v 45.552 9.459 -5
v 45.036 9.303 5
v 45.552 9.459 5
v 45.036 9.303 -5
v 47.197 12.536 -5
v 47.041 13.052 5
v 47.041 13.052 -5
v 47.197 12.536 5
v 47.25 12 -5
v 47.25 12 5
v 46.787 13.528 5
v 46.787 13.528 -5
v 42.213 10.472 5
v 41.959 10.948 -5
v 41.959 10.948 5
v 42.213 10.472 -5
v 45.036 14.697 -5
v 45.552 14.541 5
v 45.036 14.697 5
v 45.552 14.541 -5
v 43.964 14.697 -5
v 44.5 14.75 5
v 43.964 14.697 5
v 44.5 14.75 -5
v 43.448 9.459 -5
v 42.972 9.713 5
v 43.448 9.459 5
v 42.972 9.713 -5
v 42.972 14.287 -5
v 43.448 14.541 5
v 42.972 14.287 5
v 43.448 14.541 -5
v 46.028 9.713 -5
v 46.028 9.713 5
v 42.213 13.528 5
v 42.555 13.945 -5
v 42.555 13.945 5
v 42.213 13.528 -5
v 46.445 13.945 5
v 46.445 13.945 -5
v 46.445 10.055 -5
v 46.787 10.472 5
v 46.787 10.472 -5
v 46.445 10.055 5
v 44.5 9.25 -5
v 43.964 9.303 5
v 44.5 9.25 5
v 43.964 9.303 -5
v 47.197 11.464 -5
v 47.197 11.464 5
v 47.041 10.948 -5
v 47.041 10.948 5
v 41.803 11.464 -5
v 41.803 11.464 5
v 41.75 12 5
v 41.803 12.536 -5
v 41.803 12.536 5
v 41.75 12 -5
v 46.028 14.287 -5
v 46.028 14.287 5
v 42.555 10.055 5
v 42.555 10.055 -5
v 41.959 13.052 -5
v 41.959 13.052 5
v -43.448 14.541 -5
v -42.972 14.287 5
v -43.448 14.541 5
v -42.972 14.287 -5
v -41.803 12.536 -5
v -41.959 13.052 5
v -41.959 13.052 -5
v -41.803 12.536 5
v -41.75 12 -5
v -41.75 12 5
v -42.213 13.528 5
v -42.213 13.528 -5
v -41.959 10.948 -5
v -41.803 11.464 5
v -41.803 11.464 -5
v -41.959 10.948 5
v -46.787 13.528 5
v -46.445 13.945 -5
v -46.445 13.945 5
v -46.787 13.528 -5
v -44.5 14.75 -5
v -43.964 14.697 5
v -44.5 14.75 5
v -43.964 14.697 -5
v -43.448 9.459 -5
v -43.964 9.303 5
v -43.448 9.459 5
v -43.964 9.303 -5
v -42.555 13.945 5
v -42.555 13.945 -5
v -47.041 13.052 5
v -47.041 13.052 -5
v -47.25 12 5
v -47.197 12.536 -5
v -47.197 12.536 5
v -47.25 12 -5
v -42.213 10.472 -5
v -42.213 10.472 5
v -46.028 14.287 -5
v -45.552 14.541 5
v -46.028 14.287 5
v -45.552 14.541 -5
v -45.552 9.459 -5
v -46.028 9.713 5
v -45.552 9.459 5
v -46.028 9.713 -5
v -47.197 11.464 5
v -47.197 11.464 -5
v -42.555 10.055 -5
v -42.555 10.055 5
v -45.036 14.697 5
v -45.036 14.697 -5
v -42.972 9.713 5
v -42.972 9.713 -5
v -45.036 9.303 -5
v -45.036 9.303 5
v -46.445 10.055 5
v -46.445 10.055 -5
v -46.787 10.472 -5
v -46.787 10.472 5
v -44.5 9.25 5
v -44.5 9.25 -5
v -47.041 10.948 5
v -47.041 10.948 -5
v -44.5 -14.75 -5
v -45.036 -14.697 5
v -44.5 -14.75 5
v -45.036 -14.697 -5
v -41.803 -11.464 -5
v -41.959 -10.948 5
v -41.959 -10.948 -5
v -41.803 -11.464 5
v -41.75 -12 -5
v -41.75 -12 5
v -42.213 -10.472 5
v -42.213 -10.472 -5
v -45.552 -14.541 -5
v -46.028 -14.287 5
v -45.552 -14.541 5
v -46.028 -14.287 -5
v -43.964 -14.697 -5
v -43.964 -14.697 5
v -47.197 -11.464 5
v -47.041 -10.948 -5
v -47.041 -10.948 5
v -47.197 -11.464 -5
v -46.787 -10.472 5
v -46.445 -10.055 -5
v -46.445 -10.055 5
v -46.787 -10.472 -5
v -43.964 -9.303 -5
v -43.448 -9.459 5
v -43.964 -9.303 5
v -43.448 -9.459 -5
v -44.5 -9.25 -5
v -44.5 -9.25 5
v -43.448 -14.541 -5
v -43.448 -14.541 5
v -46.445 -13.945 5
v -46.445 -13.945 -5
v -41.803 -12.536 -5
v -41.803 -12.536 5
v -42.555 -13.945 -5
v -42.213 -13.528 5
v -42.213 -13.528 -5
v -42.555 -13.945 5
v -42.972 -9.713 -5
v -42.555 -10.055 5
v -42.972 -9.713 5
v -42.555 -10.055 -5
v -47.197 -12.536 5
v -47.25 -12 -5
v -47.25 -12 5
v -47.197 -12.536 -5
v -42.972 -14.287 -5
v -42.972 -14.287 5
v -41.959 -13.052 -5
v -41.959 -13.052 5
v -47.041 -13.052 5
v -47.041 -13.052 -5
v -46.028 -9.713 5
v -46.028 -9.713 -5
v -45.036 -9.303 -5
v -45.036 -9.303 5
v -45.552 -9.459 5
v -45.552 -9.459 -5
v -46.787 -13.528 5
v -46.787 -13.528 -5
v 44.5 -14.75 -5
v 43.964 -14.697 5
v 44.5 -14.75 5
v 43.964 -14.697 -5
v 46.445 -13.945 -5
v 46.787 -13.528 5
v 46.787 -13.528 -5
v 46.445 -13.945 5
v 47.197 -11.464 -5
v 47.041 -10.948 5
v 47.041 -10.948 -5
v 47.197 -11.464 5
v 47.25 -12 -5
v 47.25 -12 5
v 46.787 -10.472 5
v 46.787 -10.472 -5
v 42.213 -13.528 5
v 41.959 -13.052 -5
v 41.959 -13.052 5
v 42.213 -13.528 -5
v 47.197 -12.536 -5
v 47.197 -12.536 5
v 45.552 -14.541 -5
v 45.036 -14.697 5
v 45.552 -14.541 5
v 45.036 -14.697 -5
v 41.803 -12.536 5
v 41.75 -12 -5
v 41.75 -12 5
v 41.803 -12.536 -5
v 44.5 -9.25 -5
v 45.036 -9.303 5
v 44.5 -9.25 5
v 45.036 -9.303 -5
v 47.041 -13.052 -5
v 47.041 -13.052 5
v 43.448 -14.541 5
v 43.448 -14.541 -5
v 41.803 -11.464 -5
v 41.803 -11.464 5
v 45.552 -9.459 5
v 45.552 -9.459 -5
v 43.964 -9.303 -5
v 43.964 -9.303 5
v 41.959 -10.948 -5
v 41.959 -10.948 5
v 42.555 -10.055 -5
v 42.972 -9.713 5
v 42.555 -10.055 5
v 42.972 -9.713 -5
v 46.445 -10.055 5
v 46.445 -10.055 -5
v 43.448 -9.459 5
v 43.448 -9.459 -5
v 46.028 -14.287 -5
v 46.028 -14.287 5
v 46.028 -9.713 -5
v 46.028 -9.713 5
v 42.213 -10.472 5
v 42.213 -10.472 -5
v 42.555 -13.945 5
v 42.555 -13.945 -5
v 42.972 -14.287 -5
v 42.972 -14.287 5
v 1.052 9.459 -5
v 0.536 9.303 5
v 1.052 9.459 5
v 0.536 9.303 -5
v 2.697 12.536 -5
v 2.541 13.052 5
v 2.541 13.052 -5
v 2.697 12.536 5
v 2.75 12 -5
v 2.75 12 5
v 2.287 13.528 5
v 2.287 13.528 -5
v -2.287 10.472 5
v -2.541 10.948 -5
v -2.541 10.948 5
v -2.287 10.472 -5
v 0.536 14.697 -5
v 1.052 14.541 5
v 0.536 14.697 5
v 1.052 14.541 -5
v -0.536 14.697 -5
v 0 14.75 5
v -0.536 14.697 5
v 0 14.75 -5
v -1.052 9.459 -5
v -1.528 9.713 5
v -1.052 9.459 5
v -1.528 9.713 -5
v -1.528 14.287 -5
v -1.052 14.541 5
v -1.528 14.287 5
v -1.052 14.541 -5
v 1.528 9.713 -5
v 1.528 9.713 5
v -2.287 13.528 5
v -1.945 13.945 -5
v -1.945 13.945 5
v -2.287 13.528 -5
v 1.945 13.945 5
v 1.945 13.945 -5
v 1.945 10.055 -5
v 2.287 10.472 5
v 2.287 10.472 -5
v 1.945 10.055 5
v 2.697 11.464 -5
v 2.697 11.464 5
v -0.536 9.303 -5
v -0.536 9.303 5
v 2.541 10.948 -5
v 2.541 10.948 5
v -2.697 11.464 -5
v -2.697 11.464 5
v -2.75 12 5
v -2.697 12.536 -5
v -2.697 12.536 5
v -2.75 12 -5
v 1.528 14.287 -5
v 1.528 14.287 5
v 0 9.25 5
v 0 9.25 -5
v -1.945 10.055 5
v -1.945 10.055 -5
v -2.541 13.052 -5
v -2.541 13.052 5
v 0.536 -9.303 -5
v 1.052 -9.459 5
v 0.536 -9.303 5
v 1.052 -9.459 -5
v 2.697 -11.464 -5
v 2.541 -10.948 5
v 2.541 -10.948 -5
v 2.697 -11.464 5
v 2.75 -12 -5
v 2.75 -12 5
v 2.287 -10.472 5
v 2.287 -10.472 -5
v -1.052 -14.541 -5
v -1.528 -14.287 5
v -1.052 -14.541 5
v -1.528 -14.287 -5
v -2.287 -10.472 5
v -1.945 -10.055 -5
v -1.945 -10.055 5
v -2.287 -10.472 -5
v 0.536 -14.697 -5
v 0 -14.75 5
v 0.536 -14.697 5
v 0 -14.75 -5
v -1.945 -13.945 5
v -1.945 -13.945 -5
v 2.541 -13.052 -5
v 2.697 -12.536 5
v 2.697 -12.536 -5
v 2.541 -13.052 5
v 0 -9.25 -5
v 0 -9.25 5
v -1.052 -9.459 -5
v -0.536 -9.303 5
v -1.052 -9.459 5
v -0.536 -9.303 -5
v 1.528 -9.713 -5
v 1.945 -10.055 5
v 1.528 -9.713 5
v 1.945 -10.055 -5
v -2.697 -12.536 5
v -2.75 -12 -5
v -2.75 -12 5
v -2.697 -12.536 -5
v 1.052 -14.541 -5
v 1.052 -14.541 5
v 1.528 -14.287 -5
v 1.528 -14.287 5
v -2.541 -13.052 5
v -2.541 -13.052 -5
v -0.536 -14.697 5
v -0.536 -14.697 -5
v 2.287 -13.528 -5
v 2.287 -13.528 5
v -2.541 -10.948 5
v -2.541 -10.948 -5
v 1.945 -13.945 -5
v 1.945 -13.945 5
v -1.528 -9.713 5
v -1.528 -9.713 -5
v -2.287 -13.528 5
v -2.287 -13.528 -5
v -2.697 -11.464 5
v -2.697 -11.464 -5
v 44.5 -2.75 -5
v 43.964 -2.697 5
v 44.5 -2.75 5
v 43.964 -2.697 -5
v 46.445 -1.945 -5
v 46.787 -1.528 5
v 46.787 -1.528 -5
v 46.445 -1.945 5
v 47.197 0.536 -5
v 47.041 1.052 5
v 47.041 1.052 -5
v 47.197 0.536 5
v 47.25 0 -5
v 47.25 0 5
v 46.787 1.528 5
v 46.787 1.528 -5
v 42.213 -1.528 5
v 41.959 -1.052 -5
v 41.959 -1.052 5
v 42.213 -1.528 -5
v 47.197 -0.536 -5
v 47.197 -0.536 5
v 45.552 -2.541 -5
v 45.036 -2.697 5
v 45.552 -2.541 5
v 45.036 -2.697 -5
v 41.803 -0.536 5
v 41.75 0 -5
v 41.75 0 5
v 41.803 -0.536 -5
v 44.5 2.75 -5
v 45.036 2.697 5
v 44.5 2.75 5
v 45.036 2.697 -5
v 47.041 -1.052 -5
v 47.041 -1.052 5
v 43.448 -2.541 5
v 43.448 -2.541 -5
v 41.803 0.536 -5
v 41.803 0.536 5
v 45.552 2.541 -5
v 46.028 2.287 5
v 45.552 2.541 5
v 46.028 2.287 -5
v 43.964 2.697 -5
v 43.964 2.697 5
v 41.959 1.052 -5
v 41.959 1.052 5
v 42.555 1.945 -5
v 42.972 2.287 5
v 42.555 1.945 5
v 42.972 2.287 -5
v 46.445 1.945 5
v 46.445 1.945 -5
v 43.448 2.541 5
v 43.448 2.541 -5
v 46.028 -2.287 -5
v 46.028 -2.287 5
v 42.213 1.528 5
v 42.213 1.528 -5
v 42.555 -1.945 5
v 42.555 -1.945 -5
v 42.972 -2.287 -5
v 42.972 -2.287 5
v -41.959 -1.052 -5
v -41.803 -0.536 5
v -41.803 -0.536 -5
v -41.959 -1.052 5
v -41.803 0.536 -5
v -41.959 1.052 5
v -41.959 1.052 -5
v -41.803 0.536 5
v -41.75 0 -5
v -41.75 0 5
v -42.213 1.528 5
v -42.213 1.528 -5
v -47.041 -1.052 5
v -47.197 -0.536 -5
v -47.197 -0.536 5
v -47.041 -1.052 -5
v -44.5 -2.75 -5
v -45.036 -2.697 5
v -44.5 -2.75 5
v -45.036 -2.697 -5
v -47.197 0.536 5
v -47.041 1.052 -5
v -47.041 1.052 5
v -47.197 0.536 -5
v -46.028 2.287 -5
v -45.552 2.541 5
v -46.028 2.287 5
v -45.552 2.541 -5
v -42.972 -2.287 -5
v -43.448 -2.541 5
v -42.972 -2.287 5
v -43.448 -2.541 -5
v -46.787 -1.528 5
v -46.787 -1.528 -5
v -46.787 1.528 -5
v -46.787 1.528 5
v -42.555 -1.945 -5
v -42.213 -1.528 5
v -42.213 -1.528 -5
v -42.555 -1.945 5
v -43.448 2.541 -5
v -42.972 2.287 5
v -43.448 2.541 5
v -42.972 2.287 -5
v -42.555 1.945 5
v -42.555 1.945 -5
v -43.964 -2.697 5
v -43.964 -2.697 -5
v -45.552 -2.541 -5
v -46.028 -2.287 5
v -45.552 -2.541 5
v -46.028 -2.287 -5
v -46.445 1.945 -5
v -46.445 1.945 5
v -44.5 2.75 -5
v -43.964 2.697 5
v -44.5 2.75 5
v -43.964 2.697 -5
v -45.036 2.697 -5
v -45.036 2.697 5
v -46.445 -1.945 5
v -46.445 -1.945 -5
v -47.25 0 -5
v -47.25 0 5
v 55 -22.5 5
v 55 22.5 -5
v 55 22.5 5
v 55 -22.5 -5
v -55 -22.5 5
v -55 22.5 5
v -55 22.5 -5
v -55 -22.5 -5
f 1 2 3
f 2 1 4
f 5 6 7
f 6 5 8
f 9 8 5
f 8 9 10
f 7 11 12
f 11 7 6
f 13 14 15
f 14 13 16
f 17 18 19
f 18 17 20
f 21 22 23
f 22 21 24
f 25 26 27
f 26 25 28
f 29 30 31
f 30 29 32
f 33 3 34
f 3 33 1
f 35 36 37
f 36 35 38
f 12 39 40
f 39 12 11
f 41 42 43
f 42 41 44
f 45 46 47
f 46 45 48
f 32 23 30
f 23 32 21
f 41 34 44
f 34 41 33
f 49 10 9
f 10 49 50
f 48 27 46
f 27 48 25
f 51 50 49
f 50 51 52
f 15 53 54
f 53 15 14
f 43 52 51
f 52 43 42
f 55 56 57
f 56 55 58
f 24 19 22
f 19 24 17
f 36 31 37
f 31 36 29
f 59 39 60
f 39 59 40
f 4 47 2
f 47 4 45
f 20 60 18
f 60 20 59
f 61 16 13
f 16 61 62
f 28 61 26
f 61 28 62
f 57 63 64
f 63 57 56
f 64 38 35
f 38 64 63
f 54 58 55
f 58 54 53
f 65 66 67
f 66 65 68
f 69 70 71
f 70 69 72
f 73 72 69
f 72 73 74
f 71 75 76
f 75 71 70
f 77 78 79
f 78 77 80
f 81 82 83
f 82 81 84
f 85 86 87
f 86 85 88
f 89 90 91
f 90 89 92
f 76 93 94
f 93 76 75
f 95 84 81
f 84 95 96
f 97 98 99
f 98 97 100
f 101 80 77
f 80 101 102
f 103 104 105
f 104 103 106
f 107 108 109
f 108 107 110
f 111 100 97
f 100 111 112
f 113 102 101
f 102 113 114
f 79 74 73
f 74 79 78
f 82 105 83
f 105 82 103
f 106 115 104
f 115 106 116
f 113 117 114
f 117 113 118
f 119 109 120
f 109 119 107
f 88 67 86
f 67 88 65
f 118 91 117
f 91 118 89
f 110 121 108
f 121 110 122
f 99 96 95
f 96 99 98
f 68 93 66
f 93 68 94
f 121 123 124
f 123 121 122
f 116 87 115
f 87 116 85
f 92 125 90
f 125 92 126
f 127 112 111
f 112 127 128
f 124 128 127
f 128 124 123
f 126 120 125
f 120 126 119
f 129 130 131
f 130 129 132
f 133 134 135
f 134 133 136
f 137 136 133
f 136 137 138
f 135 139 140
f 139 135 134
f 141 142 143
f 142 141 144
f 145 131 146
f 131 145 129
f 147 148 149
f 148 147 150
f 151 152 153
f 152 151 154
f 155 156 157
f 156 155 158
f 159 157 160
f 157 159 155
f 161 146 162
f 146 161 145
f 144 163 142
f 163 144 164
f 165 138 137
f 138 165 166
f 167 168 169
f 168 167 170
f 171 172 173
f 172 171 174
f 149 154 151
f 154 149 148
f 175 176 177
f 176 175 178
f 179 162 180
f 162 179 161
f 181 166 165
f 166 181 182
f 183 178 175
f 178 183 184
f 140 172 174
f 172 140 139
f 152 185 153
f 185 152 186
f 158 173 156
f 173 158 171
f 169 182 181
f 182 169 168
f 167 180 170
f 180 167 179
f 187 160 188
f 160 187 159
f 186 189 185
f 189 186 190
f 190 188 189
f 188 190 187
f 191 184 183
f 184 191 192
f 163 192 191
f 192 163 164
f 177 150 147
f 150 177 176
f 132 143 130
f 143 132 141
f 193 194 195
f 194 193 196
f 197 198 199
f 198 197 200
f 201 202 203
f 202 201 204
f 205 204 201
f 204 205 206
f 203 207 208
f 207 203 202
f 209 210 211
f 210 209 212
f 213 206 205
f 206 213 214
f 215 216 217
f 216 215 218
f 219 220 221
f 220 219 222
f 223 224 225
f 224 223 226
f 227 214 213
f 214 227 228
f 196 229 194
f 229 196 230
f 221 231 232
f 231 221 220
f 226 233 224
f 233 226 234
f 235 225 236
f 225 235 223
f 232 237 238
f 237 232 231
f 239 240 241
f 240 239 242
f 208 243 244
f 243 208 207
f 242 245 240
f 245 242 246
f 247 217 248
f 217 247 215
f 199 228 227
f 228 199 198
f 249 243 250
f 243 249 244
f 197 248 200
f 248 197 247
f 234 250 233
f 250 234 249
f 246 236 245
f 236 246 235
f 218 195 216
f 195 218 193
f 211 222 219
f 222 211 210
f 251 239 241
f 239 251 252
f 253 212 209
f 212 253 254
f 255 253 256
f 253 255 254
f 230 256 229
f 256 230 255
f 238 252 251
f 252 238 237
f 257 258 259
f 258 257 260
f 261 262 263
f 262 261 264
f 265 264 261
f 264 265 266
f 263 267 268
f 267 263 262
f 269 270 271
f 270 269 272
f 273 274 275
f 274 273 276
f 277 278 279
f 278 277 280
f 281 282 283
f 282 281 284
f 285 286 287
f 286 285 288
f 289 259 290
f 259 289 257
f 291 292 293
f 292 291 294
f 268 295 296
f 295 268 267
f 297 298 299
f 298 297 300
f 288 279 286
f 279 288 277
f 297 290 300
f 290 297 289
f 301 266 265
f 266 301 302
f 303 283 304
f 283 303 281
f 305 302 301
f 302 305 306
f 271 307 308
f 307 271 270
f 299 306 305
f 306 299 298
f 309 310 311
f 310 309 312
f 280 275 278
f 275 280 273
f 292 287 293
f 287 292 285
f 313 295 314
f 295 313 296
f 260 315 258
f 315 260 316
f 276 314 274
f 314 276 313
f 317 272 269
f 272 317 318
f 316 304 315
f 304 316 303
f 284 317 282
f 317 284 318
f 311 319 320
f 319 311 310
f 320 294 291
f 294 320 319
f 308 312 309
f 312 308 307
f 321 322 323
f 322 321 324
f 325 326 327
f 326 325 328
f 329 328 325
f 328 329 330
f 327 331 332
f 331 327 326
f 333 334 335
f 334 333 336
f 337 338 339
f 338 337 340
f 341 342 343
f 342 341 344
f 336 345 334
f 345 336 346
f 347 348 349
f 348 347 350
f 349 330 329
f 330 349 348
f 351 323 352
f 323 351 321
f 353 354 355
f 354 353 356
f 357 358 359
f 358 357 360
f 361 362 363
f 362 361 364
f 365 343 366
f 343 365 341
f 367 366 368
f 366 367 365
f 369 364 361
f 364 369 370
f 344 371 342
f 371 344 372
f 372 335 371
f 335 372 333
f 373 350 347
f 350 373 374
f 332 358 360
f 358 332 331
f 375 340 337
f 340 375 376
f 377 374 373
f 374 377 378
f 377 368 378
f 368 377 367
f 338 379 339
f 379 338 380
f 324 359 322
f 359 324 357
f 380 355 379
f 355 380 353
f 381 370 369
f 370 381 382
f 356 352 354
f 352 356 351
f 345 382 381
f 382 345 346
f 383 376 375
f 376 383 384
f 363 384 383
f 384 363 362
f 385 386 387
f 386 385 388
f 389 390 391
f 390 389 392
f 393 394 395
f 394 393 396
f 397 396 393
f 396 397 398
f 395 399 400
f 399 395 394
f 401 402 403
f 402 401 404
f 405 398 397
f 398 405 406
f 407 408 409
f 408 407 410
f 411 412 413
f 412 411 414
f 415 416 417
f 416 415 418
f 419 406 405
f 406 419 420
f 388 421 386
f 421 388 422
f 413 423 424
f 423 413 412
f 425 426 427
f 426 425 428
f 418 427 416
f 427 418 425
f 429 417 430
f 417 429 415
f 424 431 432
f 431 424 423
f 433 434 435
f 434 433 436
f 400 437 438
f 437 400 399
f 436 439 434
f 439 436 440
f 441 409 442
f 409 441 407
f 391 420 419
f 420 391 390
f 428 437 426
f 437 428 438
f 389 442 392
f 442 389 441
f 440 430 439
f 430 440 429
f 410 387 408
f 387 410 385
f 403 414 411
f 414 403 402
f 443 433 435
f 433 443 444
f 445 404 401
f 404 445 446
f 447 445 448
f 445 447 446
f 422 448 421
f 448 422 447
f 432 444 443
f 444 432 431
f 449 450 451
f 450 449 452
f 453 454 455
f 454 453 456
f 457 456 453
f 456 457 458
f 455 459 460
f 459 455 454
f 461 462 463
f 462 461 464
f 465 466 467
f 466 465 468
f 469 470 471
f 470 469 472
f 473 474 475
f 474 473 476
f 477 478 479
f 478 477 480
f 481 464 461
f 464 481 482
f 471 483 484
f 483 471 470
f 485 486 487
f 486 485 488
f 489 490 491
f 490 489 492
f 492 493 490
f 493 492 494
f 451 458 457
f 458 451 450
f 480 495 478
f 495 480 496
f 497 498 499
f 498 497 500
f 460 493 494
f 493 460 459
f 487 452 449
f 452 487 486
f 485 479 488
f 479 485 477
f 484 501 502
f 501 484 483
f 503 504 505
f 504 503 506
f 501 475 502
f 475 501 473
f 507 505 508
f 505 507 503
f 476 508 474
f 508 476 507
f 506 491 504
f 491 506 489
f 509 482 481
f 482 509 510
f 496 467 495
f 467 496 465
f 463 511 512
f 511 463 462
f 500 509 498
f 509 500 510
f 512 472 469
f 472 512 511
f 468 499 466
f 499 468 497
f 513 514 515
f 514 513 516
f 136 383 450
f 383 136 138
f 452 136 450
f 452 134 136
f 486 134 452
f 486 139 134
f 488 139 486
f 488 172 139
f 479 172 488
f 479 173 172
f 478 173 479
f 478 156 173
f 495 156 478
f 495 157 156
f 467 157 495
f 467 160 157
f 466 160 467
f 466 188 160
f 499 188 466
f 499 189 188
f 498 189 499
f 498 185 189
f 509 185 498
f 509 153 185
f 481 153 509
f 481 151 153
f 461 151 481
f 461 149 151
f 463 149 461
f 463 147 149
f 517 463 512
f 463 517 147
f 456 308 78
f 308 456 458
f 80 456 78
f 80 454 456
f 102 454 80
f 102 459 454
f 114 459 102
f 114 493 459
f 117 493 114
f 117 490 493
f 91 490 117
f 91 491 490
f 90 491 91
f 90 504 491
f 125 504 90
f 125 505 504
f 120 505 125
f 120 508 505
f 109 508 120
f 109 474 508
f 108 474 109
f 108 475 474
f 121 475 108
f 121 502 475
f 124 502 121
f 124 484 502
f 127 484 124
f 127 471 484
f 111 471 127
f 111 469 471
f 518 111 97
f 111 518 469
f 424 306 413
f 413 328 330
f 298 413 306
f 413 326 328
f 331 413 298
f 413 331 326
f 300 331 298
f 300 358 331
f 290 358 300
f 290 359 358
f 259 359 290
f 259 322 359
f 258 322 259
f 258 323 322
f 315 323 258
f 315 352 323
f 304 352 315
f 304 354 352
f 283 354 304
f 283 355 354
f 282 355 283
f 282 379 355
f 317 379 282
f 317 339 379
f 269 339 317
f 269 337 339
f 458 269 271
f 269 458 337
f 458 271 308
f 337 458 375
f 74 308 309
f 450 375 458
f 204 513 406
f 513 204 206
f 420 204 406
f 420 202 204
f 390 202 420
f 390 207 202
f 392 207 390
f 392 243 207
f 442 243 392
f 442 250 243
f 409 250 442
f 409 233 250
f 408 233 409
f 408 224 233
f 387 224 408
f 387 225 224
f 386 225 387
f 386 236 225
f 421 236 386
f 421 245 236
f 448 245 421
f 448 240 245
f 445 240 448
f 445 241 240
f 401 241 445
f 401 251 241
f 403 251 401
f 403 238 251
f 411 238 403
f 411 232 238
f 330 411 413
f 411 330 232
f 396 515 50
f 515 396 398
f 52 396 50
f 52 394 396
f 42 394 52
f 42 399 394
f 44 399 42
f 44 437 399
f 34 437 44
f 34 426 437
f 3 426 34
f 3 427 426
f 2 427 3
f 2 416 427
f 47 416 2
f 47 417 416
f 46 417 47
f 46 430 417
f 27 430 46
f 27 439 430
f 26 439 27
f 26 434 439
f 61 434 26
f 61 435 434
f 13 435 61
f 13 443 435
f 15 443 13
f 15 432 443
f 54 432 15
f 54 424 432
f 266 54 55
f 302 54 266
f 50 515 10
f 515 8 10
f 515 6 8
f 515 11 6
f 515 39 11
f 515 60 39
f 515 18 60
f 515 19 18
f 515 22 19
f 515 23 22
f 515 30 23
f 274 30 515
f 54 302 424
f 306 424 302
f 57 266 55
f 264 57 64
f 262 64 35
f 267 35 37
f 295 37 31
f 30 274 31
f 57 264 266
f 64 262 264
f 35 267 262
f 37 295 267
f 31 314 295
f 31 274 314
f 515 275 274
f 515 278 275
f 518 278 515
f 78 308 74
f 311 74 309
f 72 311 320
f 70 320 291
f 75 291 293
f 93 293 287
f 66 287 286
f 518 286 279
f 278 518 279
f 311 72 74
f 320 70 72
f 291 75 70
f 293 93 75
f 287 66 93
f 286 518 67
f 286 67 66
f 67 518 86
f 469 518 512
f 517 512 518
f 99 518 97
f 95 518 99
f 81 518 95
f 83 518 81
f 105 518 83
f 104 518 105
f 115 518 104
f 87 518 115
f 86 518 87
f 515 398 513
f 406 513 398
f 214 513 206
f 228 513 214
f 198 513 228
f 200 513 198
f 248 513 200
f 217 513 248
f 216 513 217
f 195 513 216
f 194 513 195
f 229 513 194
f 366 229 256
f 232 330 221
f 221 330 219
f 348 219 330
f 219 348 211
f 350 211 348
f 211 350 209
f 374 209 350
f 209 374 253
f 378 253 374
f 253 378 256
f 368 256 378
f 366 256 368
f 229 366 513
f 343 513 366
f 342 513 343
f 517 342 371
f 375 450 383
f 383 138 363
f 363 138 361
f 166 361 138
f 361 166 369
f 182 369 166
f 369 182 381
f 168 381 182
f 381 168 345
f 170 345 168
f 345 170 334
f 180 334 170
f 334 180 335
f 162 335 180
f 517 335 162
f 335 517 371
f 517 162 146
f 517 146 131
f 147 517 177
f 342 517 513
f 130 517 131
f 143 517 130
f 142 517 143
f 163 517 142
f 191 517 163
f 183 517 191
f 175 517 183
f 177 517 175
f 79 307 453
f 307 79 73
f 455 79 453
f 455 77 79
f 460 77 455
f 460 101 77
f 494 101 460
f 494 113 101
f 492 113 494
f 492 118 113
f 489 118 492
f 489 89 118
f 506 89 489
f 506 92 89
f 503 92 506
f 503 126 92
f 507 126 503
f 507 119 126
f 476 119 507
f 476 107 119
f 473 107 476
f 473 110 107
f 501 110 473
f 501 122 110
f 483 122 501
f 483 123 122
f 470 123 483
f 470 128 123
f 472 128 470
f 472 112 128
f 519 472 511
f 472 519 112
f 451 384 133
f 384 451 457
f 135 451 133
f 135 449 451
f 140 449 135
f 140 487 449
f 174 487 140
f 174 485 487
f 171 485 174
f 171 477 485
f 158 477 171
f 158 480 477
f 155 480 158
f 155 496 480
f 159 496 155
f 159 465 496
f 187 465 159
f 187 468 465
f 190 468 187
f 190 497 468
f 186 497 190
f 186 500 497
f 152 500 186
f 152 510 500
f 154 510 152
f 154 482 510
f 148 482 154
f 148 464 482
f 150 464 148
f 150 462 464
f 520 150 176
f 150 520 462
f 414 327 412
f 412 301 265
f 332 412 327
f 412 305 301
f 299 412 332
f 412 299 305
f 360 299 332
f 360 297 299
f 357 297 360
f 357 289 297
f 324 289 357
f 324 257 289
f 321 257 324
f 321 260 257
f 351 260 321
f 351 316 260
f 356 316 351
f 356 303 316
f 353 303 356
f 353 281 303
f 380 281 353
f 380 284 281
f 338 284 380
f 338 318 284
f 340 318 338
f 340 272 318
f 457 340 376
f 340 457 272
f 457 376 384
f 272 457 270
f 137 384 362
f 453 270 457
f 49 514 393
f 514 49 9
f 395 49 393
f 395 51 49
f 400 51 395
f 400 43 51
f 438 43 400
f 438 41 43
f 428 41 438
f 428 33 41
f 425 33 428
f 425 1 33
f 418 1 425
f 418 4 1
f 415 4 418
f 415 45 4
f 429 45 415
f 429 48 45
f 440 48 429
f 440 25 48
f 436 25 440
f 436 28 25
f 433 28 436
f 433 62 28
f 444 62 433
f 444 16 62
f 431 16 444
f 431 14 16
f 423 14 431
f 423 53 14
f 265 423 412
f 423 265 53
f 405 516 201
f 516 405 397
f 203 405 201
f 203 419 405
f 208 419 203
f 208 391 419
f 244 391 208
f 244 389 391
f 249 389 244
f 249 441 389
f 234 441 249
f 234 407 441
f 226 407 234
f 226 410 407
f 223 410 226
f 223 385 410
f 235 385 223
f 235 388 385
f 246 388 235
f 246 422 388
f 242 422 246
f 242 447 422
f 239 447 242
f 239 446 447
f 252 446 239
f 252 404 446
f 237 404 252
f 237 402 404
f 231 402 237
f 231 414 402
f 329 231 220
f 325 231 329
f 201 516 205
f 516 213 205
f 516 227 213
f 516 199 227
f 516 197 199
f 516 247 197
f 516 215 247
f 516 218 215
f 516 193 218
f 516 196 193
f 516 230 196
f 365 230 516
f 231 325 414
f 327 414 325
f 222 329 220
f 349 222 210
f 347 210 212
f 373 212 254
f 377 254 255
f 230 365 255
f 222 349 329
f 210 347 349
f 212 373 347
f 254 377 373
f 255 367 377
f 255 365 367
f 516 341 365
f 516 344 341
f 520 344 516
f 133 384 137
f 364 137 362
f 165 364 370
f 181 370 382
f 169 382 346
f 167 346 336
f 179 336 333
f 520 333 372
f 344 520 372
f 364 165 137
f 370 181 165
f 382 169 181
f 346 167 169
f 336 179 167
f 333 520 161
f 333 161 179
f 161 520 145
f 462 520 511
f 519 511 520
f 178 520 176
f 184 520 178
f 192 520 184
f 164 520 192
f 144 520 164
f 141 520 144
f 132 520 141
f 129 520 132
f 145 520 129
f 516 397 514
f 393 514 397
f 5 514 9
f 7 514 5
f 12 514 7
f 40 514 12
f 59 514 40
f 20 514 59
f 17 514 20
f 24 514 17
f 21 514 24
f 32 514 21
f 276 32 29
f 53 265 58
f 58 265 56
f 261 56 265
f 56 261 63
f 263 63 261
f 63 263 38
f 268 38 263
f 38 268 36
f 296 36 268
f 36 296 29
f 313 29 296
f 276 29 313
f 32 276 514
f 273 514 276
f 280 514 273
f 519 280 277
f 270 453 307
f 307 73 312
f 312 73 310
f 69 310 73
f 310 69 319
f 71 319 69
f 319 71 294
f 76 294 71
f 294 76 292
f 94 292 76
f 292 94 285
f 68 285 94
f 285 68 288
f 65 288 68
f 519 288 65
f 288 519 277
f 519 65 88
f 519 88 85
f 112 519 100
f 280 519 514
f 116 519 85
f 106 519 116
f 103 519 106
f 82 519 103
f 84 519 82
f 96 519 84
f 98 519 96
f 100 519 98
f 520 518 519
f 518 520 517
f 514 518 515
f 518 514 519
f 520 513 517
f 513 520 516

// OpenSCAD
$fn = 32;

// ----------------------------------------------------------------------
// Corner plate 110 x 45 x 10
// 8 holes, centres taken from the edge offset
// ----------------------------------------------------------------------

// --- parameters (mm) ---
plate = [110, 45, 10];  // overall size (x, y, z)
holes = 8;              // number of holes the drawing asks for
hole_d = 5.5;           // hole diameter
edge = 10.5;            // hole centre offset from the plate edge

// --- derived feature positions (mm) ---
corner_x = plate[0] / 2 - edge;  // = 44.5   corner hole X
corner_y = plate[1] / 2 - edge;  // = 12   corner hole Y
feature_centers = [
  [corner_x, corner_y],
  [-corner_x, corner_y],
  [-corner_x, -corner_y],
  [corner_x, -corner_y],
  [0, corner_y],
  [0, -corner_y],
  [corner_x, 0],
  [-corner_x, 0]
];   // hole centres the loop below drills

// plate outline, every hole drilled through with the same cutters
difference() {
  cube(plate, center = true);
  for (centre = feature_centers)
    translate([centre[0], centre[1], 0])
      cylinder(d = hole_d, h = plate[2] + 2, center = true);
}
